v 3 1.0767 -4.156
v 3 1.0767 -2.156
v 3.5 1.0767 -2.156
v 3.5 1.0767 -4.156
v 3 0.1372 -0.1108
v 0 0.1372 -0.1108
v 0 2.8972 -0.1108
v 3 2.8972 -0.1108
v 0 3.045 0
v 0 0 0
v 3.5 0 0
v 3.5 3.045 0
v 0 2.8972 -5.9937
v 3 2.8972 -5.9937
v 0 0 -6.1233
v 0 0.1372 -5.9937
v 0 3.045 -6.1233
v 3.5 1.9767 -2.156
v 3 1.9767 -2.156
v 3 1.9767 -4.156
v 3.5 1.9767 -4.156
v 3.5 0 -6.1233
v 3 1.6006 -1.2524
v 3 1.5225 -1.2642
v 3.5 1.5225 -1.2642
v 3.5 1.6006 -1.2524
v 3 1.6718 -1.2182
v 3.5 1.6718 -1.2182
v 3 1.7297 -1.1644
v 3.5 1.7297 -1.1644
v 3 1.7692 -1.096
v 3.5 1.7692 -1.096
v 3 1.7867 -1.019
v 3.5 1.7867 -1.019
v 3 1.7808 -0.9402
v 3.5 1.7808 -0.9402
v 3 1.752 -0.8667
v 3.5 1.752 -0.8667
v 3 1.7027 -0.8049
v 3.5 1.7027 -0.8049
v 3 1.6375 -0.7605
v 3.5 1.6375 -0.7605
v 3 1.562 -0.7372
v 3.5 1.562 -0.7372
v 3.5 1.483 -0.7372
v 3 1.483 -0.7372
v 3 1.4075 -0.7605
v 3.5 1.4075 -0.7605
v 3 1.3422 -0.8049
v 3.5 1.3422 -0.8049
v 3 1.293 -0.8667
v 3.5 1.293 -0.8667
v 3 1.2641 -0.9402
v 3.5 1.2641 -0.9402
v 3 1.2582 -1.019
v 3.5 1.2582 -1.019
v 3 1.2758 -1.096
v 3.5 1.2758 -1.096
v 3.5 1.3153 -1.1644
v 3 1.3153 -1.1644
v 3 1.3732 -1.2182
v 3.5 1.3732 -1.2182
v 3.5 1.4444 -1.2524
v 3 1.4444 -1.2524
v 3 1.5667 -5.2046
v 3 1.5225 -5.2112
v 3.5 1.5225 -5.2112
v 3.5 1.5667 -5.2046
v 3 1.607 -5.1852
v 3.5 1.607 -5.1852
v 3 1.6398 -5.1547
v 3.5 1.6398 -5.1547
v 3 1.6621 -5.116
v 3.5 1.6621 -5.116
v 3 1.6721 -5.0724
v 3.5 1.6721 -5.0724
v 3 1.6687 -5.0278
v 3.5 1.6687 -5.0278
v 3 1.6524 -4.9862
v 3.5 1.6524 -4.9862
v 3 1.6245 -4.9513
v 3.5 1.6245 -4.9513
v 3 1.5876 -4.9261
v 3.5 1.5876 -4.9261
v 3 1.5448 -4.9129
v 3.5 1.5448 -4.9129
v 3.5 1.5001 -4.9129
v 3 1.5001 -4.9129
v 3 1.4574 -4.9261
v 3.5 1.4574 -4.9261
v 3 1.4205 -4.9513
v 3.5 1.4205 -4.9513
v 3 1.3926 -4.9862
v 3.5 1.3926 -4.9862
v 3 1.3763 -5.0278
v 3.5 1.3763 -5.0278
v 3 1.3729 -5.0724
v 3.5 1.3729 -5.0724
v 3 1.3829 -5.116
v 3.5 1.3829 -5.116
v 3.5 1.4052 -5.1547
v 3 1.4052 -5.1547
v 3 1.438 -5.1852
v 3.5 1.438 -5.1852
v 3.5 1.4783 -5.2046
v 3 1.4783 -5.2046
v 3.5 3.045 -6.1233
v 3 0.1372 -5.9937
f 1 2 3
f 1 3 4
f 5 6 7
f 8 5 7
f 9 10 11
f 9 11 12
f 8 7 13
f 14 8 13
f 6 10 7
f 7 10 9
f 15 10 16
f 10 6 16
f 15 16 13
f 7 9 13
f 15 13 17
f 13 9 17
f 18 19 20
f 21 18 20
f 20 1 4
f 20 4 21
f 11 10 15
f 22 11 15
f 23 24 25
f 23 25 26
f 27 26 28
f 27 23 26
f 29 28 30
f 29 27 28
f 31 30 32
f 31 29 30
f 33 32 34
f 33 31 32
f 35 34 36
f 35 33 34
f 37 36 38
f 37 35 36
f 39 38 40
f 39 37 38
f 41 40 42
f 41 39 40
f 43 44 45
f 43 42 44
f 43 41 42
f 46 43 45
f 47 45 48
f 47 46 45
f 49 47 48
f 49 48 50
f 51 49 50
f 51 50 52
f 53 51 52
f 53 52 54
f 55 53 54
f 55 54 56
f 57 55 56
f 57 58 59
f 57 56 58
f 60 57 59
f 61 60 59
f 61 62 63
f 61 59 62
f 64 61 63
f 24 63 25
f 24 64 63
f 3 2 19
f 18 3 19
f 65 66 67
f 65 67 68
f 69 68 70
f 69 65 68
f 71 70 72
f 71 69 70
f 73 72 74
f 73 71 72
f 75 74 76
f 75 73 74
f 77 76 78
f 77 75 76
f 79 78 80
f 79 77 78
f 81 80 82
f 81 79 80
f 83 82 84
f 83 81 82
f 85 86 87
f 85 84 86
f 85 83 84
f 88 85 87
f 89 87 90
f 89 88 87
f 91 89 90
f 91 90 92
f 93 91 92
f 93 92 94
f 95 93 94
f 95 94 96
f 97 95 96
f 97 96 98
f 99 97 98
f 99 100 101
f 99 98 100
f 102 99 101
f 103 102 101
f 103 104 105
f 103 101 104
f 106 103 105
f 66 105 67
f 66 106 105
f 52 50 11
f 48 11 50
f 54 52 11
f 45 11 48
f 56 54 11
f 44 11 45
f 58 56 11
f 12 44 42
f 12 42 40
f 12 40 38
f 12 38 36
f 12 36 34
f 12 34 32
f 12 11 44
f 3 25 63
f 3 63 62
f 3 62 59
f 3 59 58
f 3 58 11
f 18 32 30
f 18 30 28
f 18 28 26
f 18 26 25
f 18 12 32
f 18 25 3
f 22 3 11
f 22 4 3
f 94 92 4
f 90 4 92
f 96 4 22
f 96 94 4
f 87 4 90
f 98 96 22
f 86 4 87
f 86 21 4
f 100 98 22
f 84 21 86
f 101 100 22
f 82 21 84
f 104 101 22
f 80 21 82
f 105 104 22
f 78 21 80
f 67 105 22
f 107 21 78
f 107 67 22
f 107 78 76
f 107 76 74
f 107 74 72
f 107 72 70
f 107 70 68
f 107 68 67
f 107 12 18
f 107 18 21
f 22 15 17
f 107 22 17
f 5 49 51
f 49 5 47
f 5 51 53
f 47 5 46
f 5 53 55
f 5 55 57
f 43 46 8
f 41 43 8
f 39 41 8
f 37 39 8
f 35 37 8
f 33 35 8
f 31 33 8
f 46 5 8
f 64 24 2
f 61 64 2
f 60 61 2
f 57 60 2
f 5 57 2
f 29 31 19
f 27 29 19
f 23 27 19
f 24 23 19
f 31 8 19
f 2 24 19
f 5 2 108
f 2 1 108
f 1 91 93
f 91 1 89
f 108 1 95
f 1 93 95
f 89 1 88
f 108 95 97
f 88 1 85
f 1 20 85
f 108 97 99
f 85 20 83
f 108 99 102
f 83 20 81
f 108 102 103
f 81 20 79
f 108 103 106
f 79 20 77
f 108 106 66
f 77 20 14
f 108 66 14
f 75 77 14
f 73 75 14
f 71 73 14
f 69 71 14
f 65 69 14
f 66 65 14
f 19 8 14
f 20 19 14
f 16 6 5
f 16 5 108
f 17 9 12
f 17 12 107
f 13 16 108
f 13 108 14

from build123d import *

# Parameters (mm, degrees)
SKETCH3_W               = 6.123251055
SKETCH3_H               = 3.044978856
BOSS_EXTRUDE1_DEPTH     = 3.5
SKETCH4_W               = 5.882824508
SKETCH4_H               = 2.759961498
CUT_EXTRUDE1_DEPTH      = 3
CUT_EXTRUDE1_DEPTH_BACK = 3.5
SKETCH5_W               = 2
SKETCH5_H               = 0.9
SKETCH5_R               = 0.265
SKETCH5_R_2             = 0.15
CUT_EXTRUDE4_DEPTH      = 19
CUT_EXTRUDE4_DEPTH_BACK = 9.5


with BuildPart() as part:
    # Sketch3 → Boss-Extrude1 (new body)
    with BuildSketch(Plane(origin=(0, 0, 0), x_dir=(0, 0, -1), z_dir=(1, 0, 0))):
        with Locations((3.061625528, 1.522489428)):
            Rectangle(SKETCH3_W, SKETCH3_H)
    extrude(amount=BOSS_EXTRUDE1_DEPTH)

    # Sketch4 → Cut-Extrude1 (cut, two sides)
    with BuildSketch(Plane(origin=(0, 0, 0), x_dir=(0, 0, -1), z_dir=(1, 0, 0))) as cut_extrude1_sk:
        with Locations((3.052253754, 1.517218169)):
            Rectangle(SKETCH4_W, SKETCH4_H)
    extrude(amount=CUT_EXTRUDE1_DEPTH, mode=Mode.SUBTRACT)
    extrude(cut_extrude1_sk.sketch, amount=-CUT_EXTRUDE1_DEPTH_BACK, mode=Mode.SUBTRACT)

    # Sketch5 → Cut-Extrude4 (cut, two sides)
    with BuildSketch(Plane(origin=(0, 0, 0), x_dir=(0, 0, -1), z_dir=(1, 0, 0))) as cut_extrude4_sk:
        with Locations((3.155962341, 1.526656808)):
            Rectangle(SKETCH5_W, SKETCH5_H)
        with Locations((0.999206787, 1.522489428)):
            Circle(SKETCH5_R)
        with Locations((5.061218107, 1.522489428)):
            Circle(SKETCH5_R_2)
    extrude(amount=CUT_EXTRUDE4_DEPTH, mode=Mode.SUBTRACT)
    extrude(cut_extrude4_sk.sketch, amount=-CUT_EXTRUDE4_DEPTH_BACK, mode=Mode.SUBTRACT)


solid = part.part
